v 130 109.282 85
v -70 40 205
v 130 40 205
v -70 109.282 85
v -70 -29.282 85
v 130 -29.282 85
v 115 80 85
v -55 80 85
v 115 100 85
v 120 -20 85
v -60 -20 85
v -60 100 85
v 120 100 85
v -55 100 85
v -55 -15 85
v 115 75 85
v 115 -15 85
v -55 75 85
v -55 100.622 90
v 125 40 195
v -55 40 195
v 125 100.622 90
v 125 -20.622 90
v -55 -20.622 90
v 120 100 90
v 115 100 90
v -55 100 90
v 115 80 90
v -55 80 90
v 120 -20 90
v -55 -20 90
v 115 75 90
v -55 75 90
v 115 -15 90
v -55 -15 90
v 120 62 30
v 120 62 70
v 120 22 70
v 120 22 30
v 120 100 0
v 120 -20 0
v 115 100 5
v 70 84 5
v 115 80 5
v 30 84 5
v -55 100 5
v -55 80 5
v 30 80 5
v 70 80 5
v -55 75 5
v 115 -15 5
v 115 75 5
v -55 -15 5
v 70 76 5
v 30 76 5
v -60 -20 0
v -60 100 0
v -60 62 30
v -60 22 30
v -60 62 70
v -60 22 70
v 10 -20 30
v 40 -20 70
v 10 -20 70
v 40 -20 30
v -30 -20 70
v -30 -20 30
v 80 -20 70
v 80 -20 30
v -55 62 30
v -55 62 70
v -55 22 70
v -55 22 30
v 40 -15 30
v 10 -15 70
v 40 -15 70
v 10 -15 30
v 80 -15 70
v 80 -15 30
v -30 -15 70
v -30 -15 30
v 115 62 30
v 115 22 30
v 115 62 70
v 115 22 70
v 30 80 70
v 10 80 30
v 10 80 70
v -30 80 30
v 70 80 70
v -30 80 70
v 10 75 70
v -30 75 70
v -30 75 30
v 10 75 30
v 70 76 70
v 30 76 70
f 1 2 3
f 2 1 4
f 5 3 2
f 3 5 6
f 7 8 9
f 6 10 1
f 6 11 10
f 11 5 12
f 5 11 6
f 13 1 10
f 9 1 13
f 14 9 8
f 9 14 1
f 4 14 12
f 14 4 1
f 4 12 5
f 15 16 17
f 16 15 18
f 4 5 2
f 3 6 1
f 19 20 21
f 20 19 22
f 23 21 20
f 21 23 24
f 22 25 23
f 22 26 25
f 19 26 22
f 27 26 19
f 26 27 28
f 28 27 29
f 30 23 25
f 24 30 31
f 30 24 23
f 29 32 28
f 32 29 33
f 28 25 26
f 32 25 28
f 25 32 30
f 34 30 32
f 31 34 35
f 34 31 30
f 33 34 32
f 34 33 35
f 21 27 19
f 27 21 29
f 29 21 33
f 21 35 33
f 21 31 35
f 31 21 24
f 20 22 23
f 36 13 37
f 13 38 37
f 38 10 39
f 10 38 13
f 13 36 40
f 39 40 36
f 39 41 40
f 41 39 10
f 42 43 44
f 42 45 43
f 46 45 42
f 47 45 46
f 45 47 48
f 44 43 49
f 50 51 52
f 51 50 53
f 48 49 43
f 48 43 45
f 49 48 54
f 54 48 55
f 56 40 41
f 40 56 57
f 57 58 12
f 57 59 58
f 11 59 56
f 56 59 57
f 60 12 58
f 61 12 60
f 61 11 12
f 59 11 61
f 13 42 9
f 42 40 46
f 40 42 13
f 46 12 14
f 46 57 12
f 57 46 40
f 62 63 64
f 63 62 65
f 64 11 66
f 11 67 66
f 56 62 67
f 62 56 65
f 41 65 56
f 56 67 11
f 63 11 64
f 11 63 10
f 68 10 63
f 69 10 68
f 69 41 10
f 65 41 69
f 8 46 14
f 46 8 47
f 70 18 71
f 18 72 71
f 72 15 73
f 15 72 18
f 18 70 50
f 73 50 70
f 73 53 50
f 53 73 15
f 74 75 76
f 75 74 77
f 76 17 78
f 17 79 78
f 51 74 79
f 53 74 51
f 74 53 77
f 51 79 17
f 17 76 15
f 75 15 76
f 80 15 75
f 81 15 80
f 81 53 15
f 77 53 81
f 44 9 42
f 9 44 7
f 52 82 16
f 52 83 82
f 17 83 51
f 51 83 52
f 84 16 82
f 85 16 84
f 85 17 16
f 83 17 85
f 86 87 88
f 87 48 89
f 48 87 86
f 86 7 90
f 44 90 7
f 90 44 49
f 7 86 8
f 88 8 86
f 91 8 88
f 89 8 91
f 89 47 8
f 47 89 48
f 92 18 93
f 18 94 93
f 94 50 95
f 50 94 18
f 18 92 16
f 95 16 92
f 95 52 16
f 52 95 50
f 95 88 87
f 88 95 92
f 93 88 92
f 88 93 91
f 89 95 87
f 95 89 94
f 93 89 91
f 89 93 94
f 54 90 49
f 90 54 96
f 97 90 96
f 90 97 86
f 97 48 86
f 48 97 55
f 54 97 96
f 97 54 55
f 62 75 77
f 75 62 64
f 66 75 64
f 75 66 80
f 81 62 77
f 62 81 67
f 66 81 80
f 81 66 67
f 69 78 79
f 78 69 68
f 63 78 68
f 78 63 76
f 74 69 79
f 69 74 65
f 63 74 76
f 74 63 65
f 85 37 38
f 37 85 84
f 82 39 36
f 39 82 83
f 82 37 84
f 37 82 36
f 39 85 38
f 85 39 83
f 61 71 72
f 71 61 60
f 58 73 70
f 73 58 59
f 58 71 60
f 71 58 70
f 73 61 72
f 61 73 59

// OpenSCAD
$fn=3;
difference(){
union(){
translate([-60,-20,0]) cube([180,120,5]);
 translate([-60,-20,0,]) cube([5,120,90]);
 translate([-60,-20,0]) cube([180,5,90]);
 translate([115,-20,0]) cube([5,120,90]); 
 translate([-60,75,0]) cube([180,5,90]);
difference(){
 rotate([0,1350,0]) translate([125,40,-130]) cylinder(200,80,80);
 rotate([0,1350,0]) translate([125,40,-125]) cylinder(180,70,70);
}
}
 translate([-30,74,30]) cube([40,8,40]);
 translate([30,76,5]) cube([40,8,65]);
 translate([-30,-22,30]) cube([40,8,40]);
 translate([40,-22,30]) cube([40,8,40]);
 translate([114,22,30]) cube([8,40,40]);
 translate([-61,22,30]) cube([8,40,40]);
}

 
